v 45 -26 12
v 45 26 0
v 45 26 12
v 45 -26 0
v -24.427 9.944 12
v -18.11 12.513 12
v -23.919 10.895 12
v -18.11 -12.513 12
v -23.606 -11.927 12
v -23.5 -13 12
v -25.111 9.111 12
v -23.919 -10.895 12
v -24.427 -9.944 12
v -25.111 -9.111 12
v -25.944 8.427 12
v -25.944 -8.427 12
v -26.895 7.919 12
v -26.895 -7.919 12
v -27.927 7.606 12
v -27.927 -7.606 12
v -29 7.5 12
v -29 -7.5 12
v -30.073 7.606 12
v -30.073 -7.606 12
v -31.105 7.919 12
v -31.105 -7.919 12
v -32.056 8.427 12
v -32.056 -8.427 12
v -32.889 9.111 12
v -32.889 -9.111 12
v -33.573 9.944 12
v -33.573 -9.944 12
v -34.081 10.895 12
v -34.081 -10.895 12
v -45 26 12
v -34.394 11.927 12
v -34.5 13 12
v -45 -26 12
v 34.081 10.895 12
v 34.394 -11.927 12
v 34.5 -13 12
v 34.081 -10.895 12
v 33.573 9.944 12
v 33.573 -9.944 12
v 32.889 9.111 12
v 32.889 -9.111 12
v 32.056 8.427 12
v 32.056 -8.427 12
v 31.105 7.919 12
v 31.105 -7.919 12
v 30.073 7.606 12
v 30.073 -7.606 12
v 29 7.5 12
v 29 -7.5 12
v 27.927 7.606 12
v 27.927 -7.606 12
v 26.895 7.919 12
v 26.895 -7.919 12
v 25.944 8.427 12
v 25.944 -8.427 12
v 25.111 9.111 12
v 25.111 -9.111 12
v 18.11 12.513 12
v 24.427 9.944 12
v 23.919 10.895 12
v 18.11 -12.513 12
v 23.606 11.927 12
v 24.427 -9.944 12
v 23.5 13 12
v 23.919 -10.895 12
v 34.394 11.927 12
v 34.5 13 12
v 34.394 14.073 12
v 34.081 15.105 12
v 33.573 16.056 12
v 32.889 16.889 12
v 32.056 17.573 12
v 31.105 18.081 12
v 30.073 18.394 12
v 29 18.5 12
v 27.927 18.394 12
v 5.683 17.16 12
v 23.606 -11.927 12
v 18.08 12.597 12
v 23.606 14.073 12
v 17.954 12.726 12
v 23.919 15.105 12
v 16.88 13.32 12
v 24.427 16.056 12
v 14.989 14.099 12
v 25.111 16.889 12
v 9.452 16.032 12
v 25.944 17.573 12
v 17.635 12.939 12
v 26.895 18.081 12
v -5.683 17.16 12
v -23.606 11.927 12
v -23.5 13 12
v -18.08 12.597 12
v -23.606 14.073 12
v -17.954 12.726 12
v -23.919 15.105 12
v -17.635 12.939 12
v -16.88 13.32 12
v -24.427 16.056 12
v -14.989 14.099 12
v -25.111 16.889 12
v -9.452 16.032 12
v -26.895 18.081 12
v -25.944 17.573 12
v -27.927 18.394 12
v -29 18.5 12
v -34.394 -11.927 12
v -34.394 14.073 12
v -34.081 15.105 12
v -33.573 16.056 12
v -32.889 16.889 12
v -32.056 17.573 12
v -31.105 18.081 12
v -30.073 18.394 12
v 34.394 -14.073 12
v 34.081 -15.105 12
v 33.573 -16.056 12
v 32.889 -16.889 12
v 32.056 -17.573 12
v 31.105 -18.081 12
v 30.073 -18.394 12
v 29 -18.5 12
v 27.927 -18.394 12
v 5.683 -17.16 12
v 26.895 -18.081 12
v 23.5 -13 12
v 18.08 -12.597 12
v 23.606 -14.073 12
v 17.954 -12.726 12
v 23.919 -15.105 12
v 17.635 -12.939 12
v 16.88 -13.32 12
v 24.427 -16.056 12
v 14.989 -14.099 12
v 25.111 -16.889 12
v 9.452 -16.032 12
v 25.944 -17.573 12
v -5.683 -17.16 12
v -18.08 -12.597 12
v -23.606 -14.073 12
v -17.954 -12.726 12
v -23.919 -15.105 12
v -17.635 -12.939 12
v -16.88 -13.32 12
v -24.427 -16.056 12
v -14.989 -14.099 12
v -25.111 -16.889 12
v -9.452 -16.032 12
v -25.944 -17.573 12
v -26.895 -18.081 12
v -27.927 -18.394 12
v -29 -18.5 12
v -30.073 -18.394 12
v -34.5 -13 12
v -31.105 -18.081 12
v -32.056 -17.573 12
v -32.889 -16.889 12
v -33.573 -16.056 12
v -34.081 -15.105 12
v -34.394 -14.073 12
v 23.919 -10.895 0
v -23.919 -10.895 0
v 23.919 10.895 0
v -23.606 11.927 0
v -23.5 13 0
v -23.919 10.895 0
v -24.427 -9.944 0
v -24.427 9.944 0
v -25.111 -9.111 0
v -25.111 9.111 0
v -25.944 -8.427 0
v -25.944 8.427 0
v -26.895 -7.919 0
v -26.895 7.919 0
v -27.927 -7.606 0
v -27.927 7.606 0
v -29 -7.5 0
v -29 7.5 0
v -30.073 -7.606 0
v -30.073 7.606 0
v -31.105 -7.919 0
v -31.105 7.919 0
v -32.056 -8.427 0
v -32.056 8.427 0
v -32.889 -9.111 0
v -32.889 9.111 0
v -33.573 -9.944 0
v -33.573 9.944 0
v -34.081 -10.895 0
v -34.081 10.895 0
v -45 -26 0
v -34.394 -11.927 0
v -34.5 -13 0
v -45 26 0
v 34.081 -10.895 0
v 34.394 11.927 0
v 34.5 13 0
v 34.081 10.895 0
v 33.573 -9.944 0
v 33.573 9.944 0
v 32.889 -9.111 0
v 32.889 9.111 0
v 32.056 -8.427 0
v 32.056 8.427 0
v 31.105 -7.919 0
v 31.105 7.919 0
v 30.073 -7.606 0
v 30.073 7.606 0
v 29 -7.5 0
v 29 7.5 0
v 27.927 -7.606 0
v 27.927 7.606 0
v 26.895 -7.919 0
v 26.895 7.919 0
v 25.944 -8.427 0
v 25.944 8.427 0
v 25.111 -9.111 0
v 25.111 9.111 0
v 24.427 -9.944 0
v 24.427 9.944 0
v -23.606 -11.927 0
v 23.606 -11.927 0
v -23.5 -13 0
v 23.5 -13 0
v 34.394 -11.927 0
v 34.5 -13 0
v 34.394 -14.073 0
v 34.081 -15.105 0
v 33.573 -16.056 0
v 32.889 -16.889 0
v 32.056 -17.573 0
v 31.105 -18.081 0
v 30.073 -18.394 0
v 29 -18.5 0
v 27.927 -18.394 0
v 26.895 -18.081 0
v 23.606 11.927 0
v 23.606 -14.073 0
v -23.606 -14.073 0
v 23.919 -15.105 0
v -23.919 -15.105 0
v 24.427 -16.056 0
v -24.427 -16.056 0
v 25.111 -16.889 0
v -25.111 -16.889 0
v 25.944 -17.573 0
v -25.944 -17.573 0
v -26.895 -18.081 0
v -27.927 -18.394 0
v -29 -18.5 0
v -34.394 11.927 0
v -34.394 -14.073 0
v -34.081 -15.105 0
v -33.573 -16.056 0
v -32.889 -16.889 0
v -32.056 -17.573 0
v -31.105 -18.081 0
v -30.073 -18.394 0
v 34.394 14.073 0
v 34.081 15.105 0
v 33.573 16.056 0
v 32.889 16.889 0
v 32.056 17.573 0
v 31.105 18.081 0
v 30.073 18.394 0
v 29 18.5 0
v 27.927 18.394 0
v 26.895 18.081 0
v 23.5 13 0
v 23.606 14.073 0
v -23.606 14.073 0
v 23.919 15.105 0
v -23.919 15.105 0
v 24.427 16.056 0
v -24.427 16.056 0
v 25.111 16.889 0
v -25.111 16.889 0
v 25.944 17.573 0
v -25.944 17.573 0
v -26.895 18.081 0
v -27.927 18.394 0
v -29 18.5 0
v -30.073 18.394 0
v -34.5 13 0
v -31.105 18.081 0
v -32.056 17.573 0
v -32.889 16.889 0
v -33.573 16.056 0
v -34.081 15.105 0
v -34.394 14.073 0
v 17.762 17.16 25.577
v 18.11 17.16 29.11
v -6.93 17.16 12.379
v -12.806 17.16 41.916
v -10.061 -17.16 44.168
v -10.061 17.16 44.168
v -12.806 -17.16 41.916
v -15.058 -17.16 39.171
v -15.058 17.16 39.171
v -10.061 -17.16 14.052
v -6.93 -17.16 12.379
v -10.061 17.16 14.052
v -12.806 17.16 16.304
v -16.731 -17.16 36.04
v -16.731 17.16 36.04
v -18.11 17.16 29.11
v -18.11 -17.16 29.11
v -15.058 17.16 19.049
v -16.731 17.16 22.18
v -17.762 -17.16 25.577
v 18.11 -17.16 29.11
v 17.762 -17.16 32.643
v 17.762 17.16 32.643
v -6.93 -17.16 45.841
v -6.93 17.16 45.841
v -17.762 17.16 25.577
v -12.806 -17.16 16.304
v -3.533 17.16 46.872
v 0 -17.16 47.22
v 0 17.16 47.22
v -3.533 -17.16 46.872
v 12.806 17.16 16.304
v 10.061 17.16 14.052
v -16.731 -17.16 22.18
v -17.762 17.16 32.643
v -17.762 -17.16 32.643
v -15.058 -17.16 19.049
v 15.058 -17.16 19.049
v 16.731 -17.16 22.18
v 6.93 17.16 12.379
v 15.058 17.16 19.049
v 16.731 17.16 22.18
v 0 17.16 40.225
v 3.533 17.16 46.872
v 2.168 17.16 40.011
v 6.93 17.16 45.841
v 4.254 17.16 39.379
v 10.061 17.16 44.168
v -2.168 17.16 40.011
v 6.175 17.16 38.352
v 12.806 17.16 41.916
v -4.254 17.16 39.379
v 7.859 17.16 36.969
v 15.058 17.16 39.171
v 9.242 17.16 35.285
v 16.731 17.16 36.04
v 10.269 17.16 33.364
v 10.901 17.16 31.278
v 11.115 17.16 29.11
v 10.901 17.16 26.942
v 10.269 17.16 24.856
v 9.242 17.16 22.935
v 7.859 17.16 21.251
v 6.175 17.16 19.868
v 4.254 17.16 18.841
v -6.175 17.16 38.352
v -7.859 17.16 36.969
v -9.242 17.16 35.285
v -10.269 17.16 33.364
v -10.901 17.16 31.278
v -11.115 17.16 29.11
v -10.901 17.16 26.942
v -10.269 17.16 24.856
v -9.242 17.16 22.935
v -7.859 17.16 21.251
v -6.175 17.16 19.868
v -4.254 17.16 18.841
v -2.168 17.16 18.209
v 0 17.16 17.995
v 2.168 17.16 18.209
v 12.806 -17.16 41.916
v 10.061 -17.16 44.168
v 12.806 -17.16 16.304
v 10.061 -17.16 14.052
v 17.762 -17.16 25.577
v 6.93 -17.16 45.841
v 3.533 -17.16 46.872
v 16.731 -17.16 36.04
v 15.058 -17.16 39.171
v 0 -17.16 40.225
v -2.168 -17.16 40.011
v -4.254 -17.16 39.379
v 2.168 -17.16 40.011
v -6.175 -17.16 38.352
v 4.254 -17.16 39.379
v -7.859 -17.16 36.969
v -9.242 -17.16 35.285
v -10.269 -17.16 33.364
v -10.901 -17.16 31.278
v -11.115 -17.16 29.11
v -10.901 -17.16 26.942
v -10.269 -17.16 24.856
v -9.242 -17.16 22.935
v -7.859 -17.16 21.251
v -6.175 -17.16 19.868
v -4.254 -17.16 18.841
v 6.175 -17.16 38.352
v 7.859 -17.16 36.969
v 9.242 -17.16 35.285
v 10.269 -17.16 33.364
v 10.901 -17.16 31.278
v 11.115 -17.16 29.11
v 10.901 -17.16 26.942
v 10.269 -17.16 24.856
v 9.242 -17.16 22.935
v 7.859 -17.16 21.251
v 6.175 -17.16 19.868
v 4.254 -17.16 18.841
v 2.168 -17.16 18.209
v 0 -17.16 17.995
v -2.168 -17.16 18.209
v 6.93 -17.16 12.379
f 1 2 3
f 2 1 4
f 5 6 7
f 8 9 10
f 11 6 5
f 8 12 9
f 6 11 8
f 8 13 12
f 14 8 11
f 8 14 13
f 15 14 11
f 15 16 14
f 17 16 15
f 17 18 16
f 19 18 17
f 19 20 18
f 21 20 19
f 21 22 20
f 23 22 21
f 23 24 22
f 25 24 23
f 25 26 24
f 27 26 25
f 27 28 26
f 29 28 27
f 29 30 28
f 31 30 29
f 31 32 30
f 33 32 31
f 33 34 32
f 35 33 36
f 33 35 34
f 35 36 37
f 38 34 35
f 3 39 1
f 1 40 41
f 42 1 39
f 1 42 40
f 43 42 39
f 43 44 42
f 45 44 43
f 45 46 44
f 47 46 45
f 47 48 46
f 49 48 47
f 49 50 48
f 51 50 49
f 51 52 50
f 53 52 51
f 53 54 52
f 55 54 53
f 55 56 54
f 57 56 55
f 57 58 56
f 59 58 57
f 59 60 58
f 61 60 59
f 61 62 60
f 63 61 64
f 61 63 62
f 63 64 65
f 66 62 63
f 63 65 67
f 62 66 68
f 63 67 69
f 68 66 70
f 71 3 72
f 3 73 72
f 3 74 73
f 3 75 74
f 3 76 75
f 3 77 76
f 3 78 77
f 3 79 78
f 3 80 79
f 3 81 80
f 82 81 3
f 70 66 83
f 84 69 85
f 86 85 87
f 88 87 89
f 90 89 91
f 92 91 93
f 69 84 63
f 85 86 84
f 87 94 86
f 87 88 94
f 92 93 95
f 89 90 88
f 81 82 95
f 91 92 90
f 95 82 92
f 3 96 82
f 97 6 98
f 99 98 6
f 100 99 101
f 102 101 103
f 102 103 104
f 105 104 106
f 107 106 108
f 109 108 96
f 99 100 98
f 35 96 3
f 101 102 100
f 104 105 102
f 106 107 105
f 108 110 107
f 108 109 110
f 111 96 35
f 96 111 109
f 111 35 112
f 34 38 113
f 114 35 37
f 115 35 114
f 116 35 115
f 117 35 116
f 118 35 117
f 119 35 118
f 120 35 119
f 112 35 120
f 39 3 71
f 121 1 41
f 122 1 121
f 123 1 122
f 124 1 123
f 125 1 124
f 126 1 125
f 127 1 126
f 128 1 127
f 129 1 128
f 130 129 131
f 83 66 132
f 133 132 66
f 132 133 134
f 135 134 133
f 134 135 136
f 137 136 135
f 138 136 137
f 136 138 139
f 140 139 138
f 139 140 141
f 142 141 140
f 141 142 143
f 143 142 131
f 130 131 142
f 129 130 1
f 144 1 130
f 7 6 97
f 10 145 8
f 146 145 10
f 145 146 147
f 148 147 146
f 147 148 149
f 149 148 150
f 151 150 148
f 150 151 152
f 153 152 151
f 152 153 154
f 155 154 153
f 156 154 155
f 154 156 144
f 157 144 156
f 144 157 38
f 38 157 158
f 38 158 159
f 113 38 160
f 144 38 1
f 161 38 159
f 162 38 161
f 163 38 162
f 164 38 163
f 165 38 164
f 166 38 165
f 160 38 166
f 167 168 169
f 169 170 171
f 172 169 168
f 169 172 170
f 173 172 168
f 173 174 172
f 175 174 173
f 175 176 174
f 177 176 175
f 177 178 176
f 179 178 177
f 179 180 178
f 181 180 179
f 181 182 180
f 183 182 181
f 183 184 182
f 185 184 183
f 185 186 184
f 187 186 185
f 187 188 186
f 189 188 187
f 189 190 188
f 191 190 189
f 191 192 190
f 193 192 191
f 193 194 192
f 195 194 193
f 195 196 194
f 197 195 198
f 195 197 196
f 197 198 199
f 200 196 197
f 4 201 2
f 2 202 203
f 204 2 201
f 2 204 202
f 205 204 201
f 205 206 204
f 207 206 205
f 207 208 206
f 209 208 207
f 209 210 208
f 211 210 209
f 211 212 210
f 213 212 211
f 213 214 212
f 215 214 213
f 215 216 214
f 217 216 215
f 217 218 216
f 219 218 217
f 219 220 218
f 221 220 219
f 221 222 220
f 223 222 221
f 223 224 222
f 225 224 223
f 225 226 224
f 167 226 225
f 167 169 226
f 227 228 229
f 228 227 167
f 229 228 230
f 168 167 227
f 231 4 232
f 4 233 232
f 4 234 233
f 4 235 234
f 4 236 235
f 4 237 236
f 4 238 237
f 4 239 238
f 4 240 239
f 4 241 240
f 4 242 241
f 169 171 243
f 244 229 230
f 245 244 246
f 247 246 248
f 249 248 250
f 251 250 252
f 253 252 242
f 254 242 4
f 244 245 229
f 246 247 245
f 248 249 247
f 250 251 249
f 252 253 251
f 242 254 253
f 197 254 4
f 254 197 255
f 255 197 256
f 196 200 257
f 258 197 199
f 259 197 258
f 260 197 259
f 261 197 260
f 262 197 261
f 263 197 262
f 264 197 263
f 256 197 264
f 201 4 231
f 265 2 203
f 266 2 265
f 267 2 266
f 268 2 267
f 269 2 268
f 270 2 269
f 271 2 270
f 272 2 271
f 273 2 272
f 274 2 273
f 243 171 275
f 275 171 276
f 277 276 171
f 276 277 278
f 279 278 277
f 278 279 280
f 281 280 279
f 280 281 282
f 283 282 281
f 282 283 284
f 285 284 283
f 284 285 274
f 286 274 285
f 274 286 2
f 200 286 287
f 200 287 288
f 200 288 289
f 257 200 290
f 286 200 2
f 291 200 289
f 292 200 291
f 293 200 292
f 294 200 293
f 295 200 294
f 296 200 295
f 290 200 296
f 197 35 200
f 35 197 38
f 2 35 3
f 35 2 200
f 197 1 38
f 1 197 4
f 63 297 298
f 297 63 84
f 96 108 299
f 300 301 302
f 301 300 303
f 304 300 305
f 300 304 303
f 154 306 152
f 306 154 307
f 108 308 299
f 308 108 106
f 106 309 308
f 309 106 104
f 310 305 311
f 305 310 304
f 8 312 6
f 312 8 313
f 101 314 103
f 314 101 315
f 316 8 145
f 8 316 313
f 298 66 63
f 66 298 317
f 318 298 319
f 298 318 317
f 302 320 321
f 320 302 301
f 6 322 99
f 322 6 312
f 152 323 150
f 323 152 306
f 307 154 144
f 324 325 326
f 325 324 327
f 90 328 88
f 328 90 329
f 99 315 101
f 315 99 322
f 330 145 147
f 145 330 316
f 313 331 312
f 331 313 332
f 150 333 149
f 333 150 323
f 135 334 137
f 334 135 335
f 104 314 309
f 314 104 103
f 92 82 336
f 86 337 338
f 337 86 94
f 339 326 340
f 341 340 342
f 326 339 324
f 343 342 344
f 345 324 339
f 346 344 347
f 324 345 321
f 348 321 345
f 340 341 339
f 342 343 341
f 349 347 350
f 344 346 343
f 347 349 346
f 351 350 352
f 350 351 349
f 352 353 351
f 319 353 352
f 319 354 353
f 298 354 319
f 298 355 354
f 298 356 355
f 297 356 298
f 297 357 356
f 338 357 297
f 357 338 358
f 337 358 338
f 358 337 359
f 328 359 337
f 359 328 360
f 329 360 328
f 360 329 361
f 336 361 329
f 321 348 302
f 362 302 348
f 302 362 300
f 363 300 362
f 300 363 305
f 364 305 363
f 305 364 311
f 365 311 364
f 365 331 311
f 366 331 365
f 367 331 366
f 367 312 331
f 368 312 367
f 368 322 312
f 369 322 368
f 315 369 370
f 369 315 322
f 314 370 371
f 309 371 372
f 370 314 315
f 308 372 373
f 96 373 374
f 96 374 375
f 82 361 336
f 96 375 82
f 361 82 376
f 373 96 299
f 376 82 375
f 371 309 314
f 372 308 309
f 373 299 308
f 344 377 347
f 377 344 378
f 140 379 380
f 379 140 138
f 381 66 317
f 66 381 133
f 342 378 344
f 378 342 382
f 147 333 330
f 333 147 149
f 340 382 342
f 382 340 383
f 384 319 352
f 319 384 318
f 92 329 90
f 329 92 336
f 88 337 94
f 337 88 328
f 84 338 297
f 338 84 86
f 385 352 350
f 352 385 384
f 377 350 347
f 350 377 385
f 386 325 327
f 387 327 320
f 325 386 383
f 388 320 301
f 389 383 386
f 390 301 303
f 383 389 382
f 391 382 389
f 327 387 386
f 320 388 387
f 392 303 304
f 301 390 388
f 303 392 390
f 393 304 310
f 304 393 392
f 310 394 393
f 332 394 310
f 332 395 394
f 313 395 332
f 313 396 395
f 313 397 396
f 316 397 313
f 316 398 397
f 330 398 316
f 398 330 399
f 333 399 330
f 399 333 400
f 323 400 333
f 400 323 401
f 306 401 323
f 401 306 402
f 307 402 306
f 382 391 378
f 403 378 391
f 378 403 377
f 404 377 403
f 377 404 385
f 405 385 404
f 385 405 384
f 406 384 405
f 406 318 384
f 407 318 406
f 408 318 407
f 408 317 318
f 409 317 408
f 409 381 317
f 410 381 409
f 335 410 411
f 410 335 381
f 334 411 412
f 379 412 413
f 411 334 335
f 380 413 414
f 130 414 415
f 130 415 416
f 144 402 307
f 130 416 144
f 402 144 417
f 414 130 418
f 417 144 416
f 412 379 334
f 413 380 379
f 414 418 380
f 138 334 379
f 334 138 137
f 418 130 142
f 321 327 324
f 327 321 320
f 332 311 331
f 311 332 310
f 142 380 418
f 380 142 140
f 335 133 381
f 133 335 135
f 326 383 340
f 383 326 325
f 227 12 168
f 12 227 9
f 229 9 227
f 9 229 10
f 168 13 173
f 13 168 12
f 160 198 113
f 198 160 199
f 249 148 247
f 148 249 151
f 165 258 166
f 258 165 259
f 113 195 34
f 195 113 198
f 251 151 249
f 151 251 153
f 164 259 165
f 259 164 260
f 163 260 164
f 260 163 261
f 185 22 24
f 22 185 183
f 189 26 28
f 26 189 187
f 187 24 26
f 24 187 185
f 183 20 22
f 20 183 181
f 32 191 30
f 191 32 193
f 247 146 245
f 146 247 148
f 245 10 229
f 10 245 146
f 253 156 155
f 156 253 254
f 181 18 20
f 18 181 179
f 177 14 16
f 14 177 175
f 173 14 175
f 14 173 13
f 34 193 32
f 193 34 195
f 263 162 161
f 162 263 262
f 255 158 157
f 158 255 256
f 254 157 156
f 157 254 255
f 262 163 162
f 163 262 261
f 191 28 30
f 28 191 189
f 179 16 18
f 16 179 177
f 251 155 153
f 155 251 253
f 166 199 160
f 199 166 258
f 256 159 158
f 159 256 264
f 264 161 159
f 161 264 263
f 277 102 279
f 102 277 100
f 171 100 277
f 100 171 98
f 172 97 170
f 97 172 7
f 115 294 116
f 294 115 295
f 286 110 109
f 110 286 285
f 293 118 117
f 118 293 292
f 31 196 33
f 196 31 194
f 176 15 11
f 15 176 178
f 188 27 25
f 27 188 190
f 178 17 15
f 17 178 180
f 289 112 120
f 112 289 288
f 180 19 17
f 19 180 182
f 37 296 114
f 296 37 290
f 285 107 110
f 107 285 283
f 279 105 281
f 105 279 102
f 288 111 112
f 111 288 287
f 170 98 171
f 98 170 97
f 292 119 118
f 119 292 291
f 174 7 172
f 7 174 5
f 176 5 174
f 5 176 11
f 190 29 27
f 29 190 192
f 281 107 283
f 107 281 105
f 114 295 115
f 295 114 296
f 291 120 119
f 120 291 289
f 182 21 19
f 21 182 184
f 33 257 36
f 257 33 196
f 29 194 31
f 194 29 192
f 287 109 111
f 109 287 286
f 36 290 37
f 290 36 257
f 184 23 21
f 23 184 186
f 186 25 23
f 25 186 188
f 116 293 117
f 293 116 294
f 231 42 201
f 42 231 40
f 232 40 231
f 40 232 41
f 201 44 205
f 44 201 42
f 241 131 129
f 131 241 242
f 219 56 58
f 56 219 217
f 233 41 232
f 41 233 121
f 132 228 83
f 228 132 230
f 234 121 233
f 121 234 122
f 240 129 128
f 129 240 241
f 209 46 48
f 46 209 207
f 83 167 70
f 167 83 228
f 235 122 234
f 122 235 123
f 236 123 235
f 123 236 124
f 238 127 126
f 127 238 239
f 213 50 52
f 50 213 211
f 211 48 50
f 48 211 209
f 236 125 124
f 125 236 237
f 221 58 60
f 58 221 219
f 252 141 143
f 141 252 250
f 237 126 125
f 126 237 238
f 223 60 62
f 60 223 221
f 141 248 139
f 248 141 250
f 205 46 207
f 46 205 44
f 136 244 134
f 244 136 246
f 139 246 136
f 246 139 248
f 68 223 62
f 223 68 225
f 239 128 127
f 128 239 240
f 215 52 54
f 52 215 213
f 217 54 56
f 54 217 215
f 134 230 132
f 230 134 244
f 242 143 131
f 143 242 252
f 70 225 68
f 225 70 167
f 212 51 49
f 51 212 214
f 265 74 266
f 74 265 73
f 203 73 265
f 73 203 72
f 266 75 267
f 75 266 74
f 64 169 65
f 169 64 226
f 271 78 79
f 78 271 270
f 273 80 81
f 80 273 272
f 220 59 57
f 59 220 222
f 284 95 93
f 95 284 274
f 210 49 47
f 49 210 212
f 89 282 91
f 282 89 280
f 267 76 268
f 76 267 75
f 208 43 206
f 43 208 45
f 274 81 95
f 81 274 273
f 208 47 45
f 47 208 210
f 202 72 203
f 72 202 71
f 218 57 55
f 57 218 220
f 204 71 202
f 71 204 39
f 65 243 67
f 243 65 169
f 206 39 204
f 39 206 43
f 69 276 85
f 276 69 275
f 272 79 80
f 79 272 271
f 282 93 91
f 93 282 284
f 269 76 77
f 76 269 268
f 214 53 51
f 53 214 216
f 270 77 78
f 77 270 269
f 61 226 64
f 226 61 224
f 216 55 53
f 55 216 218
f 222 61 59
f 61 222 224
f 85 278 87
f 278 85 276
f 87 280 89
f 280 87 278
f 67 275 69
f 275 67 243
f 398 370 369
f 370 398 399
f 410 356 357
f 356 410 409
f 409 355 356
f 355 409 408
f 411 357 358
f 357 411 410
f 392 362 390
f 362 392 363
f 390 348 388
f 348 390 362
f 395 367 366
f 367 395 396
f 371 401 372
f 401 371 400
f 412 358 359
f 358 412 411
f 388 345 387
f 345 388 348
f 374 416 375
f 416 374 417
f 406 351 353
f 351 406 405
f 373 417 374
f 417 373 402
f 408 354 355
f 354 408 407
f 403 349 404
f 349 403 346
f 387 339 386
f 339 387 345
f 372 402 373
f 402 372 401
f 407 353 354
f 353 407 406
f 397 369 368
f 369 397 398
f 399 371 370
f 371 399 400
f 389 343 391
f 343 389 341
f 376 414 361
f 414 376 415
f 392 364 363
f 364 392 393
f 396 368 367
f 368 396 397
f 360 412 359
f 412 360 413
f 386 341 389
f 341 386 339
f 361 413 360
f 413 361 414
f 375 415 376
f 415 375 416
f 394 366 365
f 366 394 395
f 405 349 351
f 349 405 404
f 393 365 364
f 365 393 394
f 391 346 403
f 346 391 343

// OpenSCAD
$fn = 32;

// ----------------------------------------------------------------------
// Bearing block: 90 x 52 mm base, 22.23 mm bore at 29.11 mm
// ----------------------------------------------------------------------

// --- parameters (mm) ---
base_w = 90;              // base width
base_d = 52;              // base depth
base_t = 12;              // base thickness
bore_d = 22.23;           // shaft / bearing bore
house_r = 18.11;          // housing outer radius
house_len = 34.32;        // housing length along the shaft
foot_w = 36.22;           // foot width under the housing
foot_len = 24.32;         // foot length along the shaft
axis_z = 29.11;           // bore axis height above the base
holes_d = 11;             // mounting holes
hole_x = 29;              // mounting hole spacing

difference() {
  union() {
    /* base plate with its underside on z = 0 */
    translate([0, 0, base_t / 2]) cube([base_w, base_d, base_t], center = true);
    /* hull foot: a straight web blending into the round housing */
    hull() {
      translate([0, 0, base_t - 0.5]) cube([foot_w, foot_len, 1.6], center = true);
      translate([0, 0, axis_z]) rotate([-90, 0, 0]) cylinder(h = house_len, d = 2 * house_r, center = true);
    }
  }
  /* bore through the housing, 2.5 mm clear on both sides */
  translate([0, 0, axis_z]) rotate([-90, 0, 0]) cylinder(h = house_len + 5, d = bore_d, center = true);
  /* mounting holes through the base plate */
  for (hx = [-29, 29]) {
    for (hy = [-13, 13]) {
      translate([hx, hy, -2.5]) cylinder(h = base_t + 5, d = holes_d);
    }
  }
}
